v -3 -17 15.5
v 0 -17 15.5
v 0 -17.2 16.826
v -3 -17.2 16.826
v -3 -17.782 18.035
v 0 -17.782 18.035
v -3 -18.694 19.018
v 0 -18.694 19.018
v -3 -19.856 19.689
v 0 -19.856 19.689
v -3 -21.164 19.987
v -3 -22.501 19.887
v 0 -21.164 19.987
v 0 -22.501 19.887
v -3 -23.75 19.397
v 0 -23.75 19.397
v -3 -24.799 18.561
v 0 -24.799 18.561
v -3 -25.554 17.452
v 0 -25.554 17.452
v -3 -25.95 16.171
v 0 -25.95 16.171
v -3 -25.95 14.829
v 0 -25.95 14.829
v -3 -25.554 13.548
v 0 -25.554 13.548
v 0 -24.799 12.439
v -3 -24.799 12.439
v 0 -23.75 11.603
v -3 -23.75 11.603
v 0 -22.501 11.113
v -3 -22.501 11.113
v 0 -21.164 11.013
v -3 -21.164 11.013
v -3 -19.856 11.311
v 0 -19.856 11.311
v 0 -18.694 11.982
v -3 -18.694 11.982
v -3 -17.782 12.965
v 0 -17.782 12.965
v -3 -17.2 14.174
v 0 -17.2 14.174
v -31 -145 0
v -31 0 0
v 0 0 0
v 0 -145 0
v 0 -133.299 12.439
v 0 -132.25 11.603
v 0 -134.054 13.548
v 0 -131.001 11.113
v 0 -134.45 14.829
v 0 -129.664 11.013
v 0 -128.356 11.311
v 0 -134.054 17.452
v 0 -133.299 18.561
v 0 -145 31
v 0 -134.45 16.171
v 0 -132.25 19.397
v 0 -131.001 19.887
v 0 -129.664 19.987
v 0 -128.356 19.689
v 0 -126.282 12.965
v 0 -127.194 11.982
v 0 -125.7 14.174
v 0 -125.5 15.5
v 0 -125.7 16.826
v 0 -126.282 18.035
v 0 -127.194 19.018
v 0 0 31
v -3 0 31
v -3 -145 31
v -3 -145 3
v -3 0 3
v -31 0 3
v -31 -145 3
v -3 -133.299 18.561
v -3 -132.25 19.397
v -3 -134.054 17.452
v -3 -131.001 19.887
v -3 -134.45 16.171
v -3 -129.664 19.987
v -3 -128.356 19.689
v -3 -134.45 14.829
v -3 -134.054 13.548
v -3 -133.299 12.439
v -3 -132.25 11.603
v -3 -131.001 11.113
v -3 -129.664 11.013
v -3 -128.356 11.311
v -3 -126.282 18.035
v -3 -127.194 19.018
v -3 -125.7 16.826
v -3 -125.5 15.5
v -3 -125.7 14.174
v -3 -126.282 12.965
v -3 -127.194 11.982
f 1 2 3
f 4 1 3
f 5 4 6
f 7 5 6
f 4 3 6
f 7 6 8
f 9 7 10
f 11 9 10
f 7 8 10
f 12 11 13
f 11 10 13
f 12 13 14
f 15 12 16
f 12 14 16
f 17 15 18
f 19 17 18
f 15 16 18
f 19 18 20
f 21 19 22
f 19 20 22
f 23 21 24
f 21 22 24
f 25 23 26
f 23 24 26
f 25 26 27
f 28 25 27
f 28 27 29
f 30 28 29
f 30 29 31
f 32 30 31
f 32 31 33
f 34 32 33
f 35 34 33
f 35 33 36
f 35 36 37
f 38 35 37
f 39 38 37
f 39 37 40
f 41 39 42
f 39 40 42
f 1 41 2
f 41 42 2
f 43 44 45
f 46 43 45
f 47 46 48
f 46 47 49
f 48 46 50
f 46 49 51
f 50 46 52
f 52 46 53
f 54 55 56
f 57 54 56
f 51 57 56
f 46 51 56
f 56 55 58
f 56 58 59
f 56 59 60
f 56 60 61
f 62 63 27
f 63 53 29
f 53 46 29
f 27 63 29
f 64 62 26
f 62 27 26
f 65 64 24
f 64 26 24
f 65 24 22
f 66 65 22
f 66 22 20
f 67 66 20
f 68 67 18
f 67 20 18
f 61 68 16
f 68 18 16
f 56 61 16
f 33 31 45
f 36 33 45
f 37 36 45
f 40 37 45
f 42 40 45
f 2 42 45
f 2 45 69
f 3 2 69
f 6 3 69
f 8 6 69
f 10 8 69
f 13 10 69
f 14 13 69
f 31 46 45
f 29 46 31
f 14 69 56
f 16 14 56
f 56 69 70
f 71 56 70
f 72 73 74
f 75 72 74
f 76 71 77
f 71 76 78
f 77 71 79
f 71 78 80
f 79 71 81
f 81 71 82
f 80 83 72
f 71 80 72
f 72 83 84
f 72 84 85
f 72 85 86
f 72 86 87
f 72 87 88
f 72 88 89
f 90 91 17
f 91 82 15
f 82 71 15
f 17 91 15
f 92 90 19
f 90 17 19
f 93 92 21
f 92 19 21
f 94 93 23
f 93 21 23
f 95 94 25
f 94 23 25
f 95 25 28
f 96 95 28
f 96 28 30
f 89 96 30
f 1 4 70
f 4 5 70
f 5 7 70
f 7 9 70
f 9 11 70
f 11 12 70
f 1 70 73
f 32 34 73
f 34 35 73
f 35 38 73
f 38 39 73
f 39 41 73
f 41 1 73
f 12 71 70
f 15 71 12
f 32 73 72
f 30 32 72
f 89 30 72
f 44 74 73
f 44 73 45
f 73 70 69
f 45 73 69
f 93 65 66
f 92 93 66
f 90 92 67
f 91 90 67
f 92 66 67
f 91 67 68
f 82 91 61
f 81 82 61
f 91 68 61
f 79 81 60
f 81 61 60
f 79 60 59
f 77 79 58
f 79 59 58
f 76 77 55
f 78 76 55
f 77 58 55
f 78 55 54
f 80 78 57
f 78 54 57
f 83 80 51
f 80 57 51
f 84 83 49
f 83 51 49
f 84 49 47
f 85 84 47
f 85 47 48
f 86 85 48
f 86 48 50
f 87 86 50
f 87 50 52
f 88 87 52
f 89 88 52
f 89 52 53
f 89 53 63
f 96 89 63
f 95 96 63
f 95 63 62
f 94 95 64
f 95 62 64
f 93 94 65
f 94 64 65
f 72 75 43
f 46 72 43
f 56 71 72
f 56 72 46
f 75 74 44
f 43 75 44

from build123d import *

# Parameters (mm, degrees)
F4_DEPTH = 145
F5_R     = 4.5
F6_DEPTH = 3


with BuildPart() as f4:
    # F3 (on Front) → F4 (new body)
    with BuildSketch(Plane.XZ):
        Polygon((-31, 0), (0, 0), (0, 31), (-3, 31), (-3, 3), (-31, 3), align=None)
    extrude(amount=F4_DEPTH)

    # F5 (on face) → F6 (cut, through all)
    with BuildSketch(Plane.YZ):
        with Locations((-130, 15.5)):
            Circle(F5_R)
        with Locations((-21.5, 15.5)):
            Circle(F5_R)
    extrude(amount=-F6_DEPTH, mode=Mode.SUBTRACT)


solid = f4.part
